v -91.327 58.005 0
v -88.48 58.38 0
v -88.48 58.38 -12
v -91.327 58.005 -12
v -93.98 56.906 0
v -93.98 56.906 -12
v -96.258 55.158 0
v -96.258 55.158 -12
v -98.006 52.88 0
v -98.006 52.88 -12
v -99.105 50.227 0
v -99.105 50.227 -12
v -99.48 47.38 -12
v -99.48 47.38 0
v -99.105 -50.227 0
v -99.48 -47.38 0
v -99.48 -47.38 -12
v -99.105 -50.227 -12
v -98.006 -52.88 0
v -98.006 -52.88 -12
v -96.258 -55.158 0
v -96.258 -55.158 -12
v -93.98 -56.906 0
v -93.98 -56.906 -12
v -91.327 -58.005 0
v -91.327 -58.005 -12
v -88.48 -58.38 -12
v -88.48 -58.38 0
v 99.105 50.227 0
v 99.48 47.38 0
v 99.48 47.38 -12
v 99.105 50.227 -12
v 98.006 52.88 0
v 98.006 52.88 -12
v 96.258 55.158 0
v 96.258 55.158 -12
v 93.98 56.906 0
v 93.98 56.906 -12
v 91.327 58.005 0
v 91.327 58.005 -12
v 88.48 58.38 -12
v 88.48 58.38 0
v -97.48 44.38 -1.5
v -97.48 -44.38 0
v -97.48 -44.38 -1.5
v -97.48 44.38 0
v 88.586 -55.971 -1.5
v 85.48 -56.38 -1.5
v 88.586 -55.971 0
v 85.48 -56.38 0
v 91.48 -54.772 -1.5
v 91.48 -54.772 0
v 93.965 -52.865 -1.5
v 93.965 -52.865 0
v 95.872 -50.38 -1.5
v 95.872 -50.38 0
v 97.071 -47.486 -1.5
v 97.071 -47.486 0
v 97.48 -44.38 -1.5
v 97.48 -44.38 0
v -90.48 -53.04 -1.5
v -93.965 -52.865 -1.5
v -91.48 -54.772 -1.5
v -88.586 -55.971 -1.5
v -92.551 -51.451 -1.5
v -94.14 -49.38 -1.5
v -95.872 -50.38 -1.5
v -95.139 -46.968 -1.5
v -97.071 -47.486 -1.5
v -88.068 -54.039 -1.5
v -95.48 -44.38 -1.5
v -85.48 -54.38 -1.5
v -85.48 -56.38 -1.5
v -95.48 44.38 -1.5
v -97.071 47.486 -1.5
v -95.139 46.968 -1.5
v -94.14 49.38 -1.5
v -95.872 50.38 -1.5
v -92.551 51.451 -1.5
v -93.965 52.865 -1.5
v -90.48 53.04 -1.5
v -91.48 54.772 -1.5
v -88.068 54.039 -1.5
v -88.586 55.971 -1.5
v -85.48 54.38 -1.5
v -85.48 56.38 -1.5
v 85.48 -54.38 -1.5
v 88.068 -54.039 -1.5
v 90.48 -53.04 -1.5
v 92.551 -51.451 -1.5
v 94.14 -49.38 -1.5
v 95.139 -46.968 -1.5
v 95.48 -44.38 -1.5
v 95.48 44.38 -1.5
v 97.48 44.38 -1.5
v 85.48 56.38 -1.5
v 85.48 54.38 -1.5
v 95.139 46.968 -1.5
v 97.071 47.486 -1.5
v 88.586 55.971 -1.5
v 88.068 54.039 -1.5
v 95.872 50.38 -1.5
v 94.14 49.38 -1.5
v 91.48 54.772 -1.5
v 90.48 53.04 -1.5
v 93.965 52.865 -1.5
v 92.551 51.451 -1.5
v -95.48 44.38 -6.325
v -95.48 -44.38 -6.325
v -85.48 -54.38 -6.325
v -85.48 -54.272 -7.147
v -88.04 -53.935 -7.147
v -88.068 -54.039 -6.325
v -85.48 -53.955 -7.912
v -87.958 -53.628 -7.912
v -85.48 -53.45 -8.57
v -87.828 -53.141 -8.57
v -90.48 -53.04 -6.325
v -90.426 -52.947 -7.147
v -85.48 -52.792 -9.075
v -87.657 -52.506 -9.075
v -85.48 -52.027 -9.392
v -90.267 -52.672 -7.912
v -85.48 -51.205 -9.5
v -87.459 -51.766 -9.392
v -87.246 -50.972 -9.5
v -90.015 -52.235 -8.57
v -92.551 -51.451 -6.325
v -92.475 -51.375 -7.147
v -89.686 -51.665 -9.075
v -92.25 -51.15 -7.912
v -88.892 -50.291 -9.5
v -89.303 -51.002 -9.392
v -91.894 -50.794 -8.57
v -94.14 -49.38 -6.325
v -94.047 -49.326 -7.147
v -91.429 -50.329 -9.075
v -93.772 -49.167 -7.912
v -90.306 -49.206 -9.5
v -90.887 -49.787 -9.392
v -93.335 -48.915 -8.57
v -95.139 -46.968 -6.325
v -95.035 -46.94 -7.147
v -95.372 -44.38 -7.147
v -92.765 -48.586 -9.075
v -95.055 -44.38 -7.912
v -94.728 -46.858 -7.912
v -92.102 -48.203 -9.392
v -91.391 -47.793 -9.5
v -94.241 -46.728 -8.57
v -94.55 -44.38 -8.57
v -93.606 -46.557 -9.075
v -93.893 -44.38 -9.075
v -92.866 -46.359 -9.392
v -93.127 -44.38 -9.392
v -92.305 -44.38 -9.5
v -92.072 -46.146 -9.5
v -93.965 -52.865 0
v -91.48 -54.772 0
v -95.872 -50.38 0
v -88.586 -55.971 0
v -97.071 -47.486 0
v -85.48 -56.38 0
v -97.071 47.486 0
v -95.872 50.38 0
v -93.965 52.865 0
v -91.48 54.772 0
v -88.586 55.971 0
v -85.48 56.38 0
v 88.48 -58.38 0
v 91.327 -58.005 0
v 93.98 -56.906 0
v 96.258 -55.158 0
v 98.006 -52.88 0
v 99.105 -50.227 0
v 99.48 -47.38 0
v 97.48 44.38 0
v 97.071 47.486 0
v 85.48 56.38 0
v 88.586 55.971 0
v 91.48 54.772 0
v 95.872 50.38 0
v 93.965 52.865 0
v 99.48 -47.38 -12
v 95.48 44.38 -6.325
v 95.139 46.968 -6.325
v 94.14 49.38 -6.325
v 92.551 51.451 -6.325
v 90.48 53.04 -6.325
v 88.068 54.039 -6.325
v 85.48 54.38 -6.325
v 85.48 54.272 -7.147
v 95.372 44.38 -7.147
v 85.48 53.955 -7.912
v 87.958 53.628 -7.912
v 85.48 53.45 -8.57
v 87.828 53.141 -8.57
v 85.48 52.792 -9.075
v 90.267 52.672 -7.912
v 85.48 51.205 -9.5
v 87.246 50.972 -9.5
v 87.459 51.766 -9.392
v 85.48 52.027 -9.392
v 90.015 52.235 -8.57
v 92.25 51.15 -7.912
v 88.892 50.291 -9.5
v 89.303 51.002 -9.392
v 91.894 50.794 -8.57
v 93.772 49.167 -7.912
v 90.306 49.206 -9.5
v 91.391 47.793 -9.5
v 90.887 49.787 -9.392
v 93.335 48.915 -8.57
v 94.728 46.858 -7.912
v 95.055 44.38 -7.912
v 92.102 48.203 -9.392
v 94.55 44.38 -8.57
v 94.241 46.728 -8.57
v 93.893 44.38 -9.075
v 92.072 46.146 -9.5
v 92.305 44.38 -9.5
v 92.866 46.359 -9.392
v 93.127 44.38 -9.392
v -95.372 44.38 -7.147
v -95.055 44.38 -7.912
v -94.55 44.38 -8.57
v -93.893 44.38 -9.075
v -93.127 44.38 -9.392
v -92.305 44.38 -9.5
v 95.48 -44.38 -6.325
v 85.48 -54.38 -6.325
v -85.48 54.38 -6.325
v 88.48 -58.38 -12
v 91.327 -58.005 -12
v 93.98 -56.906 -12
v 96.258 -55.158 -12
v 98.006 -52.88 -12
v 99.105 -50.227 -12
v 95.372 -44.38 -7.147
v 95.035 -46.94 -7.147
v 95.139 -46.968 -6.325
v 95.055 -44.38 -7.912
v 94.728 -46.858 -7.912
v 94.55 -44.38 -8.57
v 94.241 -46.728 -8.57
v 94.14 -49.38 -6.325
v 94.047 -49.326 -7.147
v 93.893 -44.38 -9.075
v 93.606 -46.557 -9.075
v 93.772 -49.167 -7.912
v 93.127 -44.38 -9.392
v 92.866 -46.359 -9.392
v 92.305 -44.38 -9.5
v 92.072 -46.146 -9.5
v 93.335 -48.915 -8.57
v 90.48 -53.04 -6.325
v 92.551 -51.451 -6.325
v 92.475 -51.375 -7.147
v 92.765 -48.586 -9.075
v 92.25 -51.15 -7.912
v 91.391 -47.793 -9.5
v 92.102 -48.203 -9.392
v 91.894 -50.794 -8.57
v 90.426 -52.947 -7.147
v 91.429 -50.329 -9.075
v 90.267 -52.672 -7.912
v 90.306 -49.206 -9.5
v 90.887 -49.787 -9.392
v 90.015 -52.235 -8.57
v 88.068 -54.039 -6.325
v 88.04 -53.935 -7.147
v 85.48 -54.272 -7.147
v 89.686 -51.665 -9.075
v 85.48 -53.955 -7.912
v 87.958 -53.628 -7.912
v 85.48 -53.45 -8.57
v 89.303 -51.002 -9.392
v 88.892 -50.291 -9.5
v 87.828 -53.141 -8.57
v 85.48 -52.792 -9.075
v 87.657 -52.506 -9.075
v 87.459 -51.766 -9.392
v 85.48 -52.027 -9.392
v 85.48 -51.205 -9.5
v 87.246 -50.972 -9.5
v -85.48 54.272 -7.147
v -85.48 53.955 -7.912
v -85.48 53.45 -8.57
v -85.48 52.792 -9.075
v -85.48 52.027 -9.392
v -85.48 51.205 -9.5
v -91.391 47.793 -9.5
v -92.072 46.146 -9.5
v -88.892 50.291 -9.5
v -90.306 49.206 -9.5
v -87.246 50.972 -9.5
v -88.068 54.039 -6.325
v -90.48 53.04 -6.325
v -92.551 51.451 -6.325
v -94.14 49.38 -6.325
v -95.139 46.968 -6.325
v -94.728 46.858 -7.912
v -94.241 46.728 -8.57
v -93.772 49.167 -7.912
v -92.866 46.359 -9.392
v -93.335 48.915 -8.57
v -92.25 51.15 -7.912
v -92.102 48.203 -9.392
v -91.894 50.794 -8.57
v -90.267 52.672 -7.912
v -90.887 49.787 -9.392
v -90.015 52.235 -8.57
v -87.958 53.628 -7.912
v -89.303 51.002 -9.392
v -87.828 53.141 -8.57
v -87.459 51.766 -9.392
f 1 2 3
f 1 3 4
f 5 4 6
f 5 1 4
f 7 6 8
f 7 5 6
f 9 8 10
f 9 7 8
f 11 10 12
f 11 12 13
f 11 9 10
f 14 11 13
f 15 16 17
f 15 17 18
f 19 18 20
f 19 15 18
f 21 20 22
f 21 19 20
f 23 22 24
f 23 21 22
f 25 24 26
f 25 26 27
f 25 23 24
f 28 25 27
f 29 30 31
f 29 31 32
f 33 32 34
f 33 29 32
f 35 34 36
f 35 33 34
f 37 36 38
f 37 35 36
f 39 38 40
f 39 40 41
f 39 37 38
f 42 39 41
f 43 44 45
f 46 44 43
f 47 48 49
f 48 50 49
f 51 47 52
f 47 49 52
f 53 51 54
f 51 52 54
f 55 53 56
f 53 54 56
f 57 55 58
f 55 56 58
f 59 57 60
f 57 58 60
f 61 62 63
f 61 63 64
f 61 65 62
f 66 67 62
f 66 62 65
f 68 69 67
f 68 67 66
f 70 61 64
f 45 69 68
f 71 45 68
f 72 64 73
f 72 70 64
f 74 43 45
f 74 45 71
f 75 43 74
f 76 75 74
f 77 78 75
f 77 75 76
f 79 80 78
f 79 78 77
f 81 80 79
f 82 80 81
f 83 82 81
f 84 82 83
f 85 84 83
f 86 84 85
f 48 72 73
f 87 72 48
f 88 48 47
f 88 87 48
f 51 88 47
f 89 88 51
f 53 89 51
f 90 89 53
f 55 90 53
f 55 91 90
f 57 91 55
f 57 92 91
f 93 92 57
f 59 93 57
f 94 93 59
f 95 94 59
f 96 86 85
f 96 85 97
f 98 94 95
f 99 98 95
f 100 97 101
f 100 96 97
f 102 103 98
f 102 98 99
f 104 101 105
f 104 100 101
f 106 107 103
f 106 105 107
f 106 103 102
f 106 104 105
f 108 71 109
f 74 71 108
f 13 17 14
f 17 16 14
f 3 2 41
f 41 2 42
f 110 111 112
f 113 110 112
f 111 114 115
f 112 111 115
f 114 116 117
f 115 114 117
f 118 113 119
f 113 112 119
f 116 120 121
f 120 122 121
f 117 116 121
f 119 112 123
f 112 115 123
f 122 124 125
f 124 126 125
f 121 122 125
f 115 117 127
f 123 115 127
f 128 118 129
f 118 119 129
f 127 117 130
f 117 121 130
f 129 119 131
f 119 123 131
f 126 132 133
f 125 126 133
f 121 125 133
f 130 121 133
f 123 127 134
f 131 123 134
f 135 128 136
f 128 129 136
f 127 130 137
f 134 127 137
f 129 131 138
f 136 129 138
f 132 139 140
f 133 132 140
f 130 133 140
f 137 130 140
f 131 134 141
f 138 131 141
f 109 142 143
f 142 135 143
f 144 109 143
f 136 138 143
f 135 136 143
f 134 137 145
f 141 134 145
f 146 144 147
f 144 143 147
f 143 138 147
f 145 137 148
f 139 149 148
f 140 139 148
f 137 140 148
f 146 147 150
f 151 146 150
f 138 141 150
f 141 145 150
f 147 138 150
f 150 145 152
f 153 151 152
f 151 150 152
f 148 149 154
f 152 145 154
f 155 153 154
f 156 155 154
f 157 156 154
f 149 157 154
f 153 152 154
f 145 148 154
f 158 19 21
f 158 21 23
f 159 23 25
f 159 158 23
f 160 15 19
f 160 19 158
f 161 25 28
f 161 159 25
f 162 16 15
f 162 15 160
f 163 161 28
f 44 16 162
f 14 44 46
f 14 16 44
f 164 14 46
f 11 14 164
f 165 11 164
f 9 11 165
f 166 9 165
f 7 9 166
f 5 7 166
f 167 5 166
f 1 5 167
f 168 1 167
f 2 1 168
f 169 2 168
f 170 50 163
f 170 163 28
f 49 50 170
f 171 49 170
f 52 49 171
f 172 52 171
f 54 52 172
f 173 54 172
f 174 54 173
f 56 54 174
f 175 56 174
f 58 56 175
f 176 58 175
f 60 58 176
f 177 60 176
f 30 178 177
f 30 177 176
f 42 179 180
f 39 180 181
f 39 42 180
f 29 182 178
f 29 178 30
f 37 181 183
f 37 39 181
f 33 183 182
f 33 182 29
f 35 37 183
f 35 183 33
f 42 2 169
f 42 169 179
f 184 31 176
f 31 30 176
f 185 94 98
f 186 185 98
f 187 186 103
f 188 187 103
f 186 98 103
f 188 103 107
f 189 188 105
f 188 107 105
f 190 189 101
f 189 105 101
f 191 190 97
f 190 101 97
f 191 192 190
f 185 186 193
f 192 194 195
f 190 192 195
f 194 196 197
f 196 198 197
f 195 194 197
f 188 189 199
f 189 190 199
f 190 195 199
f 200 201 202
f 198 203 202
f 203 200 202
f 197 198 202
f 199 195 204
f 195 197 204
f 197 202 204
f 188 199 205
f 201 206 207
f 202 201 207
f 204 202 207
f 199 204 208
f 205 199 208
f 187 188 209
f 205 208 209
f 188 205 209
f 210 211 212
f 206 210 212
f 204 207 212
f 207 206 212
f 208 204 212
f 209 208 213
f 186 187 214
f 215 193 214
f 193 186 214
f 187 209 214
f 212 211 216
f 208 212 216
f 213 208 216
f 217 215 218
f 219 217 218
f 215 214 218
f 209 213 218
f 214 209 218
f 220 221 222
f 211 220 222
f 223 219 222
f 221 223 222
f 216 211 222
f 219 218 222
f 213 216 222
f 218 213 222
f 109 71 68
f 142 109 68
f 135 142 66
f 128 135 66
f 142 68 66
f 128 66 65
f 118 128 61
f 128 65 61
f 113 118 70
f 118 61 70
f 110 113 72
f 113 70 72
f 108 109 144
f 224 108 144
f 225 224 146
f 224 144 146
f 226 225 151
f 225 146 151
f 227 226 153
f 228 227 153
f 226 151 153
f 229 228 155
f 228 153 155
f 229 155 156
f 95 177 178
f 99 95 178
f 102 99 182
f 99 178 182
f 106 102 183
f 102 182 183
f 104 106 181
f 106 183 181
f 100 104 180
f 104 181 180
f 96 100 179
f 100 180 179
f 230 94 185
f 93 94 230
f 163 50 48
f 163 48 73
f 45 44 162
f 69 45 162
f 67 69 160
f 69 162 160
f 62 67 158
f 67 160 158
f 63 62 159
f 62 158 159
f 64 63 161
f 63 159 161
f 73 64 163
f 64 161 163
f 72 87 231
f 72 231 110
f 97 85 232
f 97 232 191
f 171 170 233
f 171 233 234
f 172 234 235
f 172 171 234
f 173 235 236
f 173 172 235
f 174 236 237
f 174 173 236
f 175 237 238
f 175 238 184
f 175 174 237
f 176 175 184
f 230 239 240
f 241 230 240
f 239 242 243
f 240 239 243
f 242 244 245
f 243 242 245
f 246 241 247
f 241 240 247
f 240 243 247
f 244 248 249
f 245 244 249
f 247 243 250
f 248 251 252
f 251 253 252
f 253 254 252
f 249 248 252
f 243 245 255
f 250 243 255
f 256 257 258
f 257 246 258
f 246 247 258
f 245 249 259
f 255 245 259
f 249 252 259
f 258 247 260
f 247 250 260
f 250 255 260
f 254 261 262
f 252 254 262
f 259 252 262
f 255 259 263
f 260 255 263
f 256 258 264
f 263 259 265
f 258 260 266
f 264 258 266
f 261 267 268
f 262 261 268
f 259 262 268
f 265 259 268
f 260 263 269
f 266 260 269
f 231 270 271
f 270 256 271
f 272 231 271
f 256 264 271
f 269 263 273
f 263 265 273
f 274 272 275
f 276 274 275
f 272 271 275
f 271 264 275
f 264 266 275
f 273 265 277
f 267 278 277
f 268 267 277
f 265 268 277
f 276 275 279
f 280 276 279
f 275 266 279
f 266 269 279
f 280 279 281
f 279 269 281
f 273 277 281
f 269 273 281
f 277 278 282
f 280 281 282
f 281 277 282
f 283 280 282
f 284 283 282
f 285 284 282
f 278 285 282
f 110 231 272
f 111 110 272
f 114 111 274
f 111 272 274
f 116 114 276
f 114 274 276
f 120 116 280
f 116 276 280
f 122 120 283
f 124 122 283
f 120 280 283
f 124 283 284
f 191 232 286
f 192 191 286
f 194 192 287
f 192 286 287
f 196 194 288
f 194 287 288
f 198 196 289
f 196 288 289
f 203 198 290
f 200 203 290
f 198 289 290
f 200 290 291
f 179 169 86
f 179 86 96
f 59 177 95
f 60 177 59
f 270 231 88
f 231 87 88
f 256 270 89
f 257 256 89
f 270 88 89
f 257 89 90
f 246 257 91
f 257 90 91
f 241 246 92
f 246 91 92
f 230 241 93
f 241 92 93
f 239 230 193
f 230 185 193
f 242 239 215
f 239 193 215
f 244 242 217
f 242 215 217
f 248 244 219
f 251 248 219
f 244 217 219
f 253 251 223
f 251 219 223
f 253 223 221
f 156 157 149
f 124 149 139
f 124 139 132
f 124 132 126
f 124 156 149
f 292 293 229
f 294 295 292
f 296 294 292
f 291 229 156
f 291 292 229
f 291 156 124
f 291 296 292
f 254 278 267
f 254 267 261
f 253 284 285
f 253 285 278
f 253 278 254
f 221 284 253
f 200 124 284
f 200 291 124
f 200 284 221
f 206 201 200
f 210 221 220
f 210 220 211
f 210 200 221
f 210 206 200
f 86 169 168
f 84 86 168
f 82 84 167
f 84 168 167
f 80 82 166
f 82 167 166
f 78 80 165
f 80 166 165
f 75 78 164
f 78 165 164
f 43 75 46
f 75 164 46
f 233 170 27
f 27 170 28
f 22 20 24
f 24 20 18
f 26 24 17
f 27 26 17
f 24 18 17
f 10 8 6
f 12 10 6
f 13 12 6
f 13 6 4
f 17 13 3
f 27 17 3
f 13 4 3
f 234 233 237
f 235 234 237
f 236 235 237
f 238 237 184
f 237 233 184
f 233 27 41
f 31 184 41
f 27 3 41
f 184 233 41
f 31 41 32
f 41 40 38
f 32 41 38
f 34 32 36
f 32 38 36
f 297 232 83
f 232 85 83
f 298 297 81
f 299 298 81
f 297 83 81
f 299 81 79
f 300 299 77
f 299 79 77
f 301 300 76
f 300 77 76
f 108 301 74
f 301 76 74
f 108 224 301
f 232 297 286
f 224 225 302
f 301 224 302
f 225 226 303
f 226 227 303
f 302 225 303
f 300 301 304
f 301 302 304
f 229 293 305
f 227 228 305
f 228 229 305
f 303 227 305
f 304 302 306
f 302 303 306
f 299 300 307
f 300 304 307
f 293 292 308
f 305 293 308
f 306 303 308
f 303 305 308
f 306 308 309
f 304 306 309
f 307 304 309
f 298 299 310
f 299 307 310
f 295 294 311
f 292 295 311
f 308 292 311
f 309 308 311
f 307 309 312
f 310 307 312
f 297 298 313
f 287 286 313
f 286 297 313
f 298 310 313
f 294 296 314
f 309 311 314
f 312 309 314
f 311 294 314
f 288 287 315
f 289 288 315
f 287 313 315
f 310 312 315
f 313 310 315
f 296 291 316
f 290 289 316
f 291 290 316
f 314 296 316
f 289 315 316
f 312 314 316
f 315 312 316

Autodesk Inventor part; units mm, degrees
ref_plane "YZ Plane" through (0, 0, 0) normal (1, 0, 0) x (0, 1, 0)
ref_plane "XZ Plane" through (0, 0, 0) normal (0, 1, 0) x (-1, 0, 0)
ref_plane "XY Plane" through (0, 0, 0) normal (0, 0, 1) x (1, 0, 0)
sketch "Sketch1" plane through (0, 0, 0) normal (0, 0, 1) x (1, 0, 0)
  line L0 (77.5, 43.5) -> (77.5, -43.5) projected
  line L1 (77.5, -43.5) -> (-77.5, -43.5) projected
  line L2 (-77.5, -43.5) -> (-77.5, 43.5) projected
  line L3 (-77.5, 43.5) -> (77.5, 43.5) projected
  line L4 (85.48, 55.38) -> (-85.48, 55.38) projected
  arc A0 (-85.48, 55.38) -> (-96.48, 44.38) centre (-85.48, 44.38) ccw projected
  line L5 (-96.48, 44.38) -> (-96.48, -44.38) projected
  arc A1 (-96.48, -44.38) -> (-85.48, -55.38) centre (-85.48, -44.38) ccw projected
  line L6 (-85.48, -55.38) -> (85.48, -55.38) projected
  arc A2 (85.48, -55.38) -> (96.48, -44.38) centre (85.48, -44.38) ccw projected
  line L7 (96.48, -44.38) -> (96.48, 44.38) projected
  arc A3 (96.48, 44.38) -> (85.48, 55.38) centre (85.48, 44.38) ccw projected
  line L8 (-88.48, 58.38) -> (88.48, 58.38)
  line L9 (99.48, 47.38) -> (99.48, -47.38)
  line L10 (88.48, -58.38) -> (-88.48, -58.38)
  line L11 (-99.48, -47.38) -> (-99.48, 47.38)
  arc A4 (-88.48, 58.38) -> (-99.48, 47.38) centre (-88.48, 47.38) ccw
  arc A5 (99.48, 47.38) -> (88.48, 58.38) centre (88.48, 47.38) ccw
  arc A6 (88.48, -58.38) -> (99.48, -47.38) centre (88.48, -47.38) ccw
  arc A7 (-99.48, -47.38) -> (-88.48, -58.38) centre (-88.48, -47.38) ccw
  point P0 (0, 0)
  dimension "d0" = 3
  dimension "d1" = 3
  dimension "d2" = 3
  dimension "d3" = 3
  dimension "d4" = 11
  dimension "d5" = 11
extrude "Extrusion1" add sketch "Sketch1" against normal blind 12 contours L0 L1 L2 L3 | A3 L7 A2 L6 A1 L5 A0 L4 | L8 A5 L9 A6 L10 A7 L11 A4
sketch "Sketch2" plane through (0, 0, 0) normal (0, 0, 1) x (1, 0, 0)
  line L0 (-88.48, 58.38) -> (88.48, 58.38) projected
  arc A0 (-88.48, 58.38) -> (-99.48, 47.38) centre (-88.48, 47.38) ccw projected
  line L1 (-99.48, -47.38) -> (-99.48, 47.38) projected
  arc A1 (-99.48, -47.38) -> (-88.48, -58.38) centre (-88.48, -47.38) ccw projected
  line L2 (88.48, -58.38) -> (-88.48, -58.38) projected
  arc A2 (88.48, -58.38) -> (99.48, -47.38) centre (88.48, -47.38) ccw projected
  line L3 (99.48, 47.38) -> (99.48, -47.38) projected
  arc A3 (99.48, 47.38) -> (88.48, 58.38) centre (88.48, 47.38) ccw projected
  line L4 (77.5, 43.5) -> (77.5, -43.5) projected
  line L5 (77.5, -43.5) -> (-77.5, -43.5) projected
  line L6 (-77.5, -43.5) -> (-77.5, 43.5) projected
  line L7 (-77.5, 43.5) -> (77.5, 43.5) projected
  line L8 (85.48, 55.38) -> (-85.48, 55.38) projected
  arc A4 (-85.48, 55.38) -> (-96.48, 44.38) centre (-85.48, 44.38) ccw projected
  line L9 (-96.48, 44.38) -> (-96.48, -44.38) projected
  arc A5 (-96.48, -44.38) -> (-85.48, -55.38) centre (-85.48, -44.38) ccw projected
  line L10 (-85.48, -55.38) -> (85.48, -55.38) projected
  arc A6 (85.48, -55.38) -> (96.48, -44.38) centre (85.48, -44.38) ccw projected
  line L11 (96.48, -44.38) -> (96.48, 44.38) projected
  arc A7 (96.48, 44.38) -> (85.48, 55.38) centre (85.48, 44.38) ccw projected
  arc A8 (-85.48, 56.38) -> (-97.48, 44.38) centre (-85.48, 44.38) ccw
  line L12 (-85.48, 56.38) -> (85.48, 56.38)
  arc A9 (97.48, 44.38) -> (85.48, 56.38) centre (85.48, 44.38) ccw
  line L13 (97.48, 44.38) -> (97.48, -44.38)
  arc A10 (85.48, -56.38) -> (97.48, -44.38) centre (85.48, -44.38) ccw
  line L14 (85.48, -56.38) -> (-85.48, -56.38)
  arc A11 (-97.48, -44.38) -> (-85.48, -56.38) centre (-85.48, -44.38) ccw
  line L15 (-97.48, -44.38) -> (-97.48, 44.38)
  point P0 (0, 0)
  dimension "d8" = 1
extrude "Extrusion2" cut sketch "Sketch2" against normal blind 1.5 contours L4 L5 L6 L7 | A7 L11 A6 L10 A5 L9 A4 L8 | L12 A9 L13 A10 L14 A11 L15 A8
sketch "Sketch3" plane through (0, 0, -1.5) normal (0, 0, 1) x (1, 0, 0)
  arc A0 (-85.48, 56.38) -> (-97.48, 44.38) centre (-85.48, 44.38) ccw projected
  line L0 (-97.48, -44.38) -> (-97.48, 44.38) projected
  arc A1 (-97.48, -44.38) -> (-85.48, -56.38) centre (-85.48, -44.38) ccw projected
  line L1 (85.48, -56.38) -> (-85.48, -56.38) projected
  arc A2 (85.48, -56.38) -> (97.48, -44.38) centre (85.48, -44.38) ccw projected
  line L2 (97.48, 44.38) -> (97.48, -44.38) projected
  arc A3 (97.48, 44.38) -> (85.48, 56.38) centre (85.48, 44.38) ccw projected
  line L3 (-85.48, 56.38) -> (85.48, 56.38) projected
  arc A4 (-85.48, 54.38) -> (-95.48, 44.38) centre (-85.48, 44.38) ccw
  line L4 (-85.48, 54.38) -> (85.48, 54.38)
  arc A5 (95.48, 44.38) -> (85.48, 54.38) centre (85.48, 44.38) ccw
  line L5 (95.48, 44.38) -> (95.48, -44.38)
  arc A6 (85.48, -54.38) -> (95.48, -44.38) centre (85.48, -44.38) ccw
  line L6 (85.48, -54.38) -> (-85.48, -54.38)
  arc A7 (-95.48, -44.38) -> (-85.48, -54.38) centre (-85.48, -44.38) ccw
  line L7 (-95.48, -44.38) -> (-95.48, 44.38)
  point P0 (0, 0)
  dimension "d11" = 2
extrude "Extrusion3" cut sketch "Sketch3" against normal blind 8 contours L4 A5 L5 A6 L6 A7 L7 A4
fillet "Fillet1" radius 3.175 8 edges at (92.5511, 51.4511, -9.5) (95.48, 0, -9.5) (92.5511, -51.4511, -9.5) (0, -54.38, -9.5) (-92.5511, -51.4511, -9.5) (-95.48, 0, -9.5) (-92.5511, 51.4511, -9.5) (0, 54.38, -9.5)
sketch "Sketch4" plane through (0, 0, -12) normal (0, 0, -1) x (-1, 0, 0)
  line L0 (-35.15, 31.45) -> (43.7742, 31.45) projected
  arc A0 (46.7742, 28.45) -> (43.7742, 31.45) centre (43.7742, 28.45) ccw projected
  line L1 (46.7742, 28.45) -> (46.7742, -21.55) projected
  arc A1 (43.7742, -24.55) -> (46.7742, -21.55) centre (43.7742, -21.55) ccw projected
  line L2 (43.7742, -24.55) -> (-35.15, -24.55) projected
  arc A2 (-38.15, -21.55) -> (-35.15, -24.55) centre (-35.15, -21.55) ccw projected
  line L3 (-38.15, -21.55) -> (-38.15, 28.45) projected
  arc A3 (-35.15, 31.45) -> (-38.15, 28.45) centre (-35.15, 28.45) ccw projected
  line L4 (-48.26, 38.1) -> (48.26, 38.1)
  line L5 (50.8, 35.56) -> (50.8, -35.56)
  line L6 (48.26, -38.1) -> (-48.26, -38.1)
  line L7 (-50.8, -35.56) -> (-50.8, 35.56)
  arc A4 (-48.26, 38.1) -> (-50.8, 35.56) centre (-48.26, 35.56) ccw
  arc A5 (50.8, 35.56) -> (48.26, 38.1) centre (48.26, 35.56) ccw
  arc A6 (48.26, -38.1) -> (50.8, -35.56) centre (48.26, -35.56) ccw
  arc A7 (-50.8, -35.56) -> (-48.26, -38.1) centre (-48.26, -35.56) ccw
  point P0 (0, 0)
  point P1 (-50.8, 38.1)
  point P2 (50.8, 38.1)
  point P3 (-50.8, -38.1)
  dimension "d15" = 101.6
  dimension "d16" = 76.2
  dimension "d17" = 38.1
  dimension "d18" = 50.8
  dimension "d19" = 2.54
equation "\"d1\" = d0"
equation "\"d2\" = d0"
equation "\"d3\" = d0"
equation "\"d4\" = d5"
equation "\"d17\" = 0.5 * d16"
equation "\"d18\" = 0.5 * d15"
properties part number "Hub Enclosure"
